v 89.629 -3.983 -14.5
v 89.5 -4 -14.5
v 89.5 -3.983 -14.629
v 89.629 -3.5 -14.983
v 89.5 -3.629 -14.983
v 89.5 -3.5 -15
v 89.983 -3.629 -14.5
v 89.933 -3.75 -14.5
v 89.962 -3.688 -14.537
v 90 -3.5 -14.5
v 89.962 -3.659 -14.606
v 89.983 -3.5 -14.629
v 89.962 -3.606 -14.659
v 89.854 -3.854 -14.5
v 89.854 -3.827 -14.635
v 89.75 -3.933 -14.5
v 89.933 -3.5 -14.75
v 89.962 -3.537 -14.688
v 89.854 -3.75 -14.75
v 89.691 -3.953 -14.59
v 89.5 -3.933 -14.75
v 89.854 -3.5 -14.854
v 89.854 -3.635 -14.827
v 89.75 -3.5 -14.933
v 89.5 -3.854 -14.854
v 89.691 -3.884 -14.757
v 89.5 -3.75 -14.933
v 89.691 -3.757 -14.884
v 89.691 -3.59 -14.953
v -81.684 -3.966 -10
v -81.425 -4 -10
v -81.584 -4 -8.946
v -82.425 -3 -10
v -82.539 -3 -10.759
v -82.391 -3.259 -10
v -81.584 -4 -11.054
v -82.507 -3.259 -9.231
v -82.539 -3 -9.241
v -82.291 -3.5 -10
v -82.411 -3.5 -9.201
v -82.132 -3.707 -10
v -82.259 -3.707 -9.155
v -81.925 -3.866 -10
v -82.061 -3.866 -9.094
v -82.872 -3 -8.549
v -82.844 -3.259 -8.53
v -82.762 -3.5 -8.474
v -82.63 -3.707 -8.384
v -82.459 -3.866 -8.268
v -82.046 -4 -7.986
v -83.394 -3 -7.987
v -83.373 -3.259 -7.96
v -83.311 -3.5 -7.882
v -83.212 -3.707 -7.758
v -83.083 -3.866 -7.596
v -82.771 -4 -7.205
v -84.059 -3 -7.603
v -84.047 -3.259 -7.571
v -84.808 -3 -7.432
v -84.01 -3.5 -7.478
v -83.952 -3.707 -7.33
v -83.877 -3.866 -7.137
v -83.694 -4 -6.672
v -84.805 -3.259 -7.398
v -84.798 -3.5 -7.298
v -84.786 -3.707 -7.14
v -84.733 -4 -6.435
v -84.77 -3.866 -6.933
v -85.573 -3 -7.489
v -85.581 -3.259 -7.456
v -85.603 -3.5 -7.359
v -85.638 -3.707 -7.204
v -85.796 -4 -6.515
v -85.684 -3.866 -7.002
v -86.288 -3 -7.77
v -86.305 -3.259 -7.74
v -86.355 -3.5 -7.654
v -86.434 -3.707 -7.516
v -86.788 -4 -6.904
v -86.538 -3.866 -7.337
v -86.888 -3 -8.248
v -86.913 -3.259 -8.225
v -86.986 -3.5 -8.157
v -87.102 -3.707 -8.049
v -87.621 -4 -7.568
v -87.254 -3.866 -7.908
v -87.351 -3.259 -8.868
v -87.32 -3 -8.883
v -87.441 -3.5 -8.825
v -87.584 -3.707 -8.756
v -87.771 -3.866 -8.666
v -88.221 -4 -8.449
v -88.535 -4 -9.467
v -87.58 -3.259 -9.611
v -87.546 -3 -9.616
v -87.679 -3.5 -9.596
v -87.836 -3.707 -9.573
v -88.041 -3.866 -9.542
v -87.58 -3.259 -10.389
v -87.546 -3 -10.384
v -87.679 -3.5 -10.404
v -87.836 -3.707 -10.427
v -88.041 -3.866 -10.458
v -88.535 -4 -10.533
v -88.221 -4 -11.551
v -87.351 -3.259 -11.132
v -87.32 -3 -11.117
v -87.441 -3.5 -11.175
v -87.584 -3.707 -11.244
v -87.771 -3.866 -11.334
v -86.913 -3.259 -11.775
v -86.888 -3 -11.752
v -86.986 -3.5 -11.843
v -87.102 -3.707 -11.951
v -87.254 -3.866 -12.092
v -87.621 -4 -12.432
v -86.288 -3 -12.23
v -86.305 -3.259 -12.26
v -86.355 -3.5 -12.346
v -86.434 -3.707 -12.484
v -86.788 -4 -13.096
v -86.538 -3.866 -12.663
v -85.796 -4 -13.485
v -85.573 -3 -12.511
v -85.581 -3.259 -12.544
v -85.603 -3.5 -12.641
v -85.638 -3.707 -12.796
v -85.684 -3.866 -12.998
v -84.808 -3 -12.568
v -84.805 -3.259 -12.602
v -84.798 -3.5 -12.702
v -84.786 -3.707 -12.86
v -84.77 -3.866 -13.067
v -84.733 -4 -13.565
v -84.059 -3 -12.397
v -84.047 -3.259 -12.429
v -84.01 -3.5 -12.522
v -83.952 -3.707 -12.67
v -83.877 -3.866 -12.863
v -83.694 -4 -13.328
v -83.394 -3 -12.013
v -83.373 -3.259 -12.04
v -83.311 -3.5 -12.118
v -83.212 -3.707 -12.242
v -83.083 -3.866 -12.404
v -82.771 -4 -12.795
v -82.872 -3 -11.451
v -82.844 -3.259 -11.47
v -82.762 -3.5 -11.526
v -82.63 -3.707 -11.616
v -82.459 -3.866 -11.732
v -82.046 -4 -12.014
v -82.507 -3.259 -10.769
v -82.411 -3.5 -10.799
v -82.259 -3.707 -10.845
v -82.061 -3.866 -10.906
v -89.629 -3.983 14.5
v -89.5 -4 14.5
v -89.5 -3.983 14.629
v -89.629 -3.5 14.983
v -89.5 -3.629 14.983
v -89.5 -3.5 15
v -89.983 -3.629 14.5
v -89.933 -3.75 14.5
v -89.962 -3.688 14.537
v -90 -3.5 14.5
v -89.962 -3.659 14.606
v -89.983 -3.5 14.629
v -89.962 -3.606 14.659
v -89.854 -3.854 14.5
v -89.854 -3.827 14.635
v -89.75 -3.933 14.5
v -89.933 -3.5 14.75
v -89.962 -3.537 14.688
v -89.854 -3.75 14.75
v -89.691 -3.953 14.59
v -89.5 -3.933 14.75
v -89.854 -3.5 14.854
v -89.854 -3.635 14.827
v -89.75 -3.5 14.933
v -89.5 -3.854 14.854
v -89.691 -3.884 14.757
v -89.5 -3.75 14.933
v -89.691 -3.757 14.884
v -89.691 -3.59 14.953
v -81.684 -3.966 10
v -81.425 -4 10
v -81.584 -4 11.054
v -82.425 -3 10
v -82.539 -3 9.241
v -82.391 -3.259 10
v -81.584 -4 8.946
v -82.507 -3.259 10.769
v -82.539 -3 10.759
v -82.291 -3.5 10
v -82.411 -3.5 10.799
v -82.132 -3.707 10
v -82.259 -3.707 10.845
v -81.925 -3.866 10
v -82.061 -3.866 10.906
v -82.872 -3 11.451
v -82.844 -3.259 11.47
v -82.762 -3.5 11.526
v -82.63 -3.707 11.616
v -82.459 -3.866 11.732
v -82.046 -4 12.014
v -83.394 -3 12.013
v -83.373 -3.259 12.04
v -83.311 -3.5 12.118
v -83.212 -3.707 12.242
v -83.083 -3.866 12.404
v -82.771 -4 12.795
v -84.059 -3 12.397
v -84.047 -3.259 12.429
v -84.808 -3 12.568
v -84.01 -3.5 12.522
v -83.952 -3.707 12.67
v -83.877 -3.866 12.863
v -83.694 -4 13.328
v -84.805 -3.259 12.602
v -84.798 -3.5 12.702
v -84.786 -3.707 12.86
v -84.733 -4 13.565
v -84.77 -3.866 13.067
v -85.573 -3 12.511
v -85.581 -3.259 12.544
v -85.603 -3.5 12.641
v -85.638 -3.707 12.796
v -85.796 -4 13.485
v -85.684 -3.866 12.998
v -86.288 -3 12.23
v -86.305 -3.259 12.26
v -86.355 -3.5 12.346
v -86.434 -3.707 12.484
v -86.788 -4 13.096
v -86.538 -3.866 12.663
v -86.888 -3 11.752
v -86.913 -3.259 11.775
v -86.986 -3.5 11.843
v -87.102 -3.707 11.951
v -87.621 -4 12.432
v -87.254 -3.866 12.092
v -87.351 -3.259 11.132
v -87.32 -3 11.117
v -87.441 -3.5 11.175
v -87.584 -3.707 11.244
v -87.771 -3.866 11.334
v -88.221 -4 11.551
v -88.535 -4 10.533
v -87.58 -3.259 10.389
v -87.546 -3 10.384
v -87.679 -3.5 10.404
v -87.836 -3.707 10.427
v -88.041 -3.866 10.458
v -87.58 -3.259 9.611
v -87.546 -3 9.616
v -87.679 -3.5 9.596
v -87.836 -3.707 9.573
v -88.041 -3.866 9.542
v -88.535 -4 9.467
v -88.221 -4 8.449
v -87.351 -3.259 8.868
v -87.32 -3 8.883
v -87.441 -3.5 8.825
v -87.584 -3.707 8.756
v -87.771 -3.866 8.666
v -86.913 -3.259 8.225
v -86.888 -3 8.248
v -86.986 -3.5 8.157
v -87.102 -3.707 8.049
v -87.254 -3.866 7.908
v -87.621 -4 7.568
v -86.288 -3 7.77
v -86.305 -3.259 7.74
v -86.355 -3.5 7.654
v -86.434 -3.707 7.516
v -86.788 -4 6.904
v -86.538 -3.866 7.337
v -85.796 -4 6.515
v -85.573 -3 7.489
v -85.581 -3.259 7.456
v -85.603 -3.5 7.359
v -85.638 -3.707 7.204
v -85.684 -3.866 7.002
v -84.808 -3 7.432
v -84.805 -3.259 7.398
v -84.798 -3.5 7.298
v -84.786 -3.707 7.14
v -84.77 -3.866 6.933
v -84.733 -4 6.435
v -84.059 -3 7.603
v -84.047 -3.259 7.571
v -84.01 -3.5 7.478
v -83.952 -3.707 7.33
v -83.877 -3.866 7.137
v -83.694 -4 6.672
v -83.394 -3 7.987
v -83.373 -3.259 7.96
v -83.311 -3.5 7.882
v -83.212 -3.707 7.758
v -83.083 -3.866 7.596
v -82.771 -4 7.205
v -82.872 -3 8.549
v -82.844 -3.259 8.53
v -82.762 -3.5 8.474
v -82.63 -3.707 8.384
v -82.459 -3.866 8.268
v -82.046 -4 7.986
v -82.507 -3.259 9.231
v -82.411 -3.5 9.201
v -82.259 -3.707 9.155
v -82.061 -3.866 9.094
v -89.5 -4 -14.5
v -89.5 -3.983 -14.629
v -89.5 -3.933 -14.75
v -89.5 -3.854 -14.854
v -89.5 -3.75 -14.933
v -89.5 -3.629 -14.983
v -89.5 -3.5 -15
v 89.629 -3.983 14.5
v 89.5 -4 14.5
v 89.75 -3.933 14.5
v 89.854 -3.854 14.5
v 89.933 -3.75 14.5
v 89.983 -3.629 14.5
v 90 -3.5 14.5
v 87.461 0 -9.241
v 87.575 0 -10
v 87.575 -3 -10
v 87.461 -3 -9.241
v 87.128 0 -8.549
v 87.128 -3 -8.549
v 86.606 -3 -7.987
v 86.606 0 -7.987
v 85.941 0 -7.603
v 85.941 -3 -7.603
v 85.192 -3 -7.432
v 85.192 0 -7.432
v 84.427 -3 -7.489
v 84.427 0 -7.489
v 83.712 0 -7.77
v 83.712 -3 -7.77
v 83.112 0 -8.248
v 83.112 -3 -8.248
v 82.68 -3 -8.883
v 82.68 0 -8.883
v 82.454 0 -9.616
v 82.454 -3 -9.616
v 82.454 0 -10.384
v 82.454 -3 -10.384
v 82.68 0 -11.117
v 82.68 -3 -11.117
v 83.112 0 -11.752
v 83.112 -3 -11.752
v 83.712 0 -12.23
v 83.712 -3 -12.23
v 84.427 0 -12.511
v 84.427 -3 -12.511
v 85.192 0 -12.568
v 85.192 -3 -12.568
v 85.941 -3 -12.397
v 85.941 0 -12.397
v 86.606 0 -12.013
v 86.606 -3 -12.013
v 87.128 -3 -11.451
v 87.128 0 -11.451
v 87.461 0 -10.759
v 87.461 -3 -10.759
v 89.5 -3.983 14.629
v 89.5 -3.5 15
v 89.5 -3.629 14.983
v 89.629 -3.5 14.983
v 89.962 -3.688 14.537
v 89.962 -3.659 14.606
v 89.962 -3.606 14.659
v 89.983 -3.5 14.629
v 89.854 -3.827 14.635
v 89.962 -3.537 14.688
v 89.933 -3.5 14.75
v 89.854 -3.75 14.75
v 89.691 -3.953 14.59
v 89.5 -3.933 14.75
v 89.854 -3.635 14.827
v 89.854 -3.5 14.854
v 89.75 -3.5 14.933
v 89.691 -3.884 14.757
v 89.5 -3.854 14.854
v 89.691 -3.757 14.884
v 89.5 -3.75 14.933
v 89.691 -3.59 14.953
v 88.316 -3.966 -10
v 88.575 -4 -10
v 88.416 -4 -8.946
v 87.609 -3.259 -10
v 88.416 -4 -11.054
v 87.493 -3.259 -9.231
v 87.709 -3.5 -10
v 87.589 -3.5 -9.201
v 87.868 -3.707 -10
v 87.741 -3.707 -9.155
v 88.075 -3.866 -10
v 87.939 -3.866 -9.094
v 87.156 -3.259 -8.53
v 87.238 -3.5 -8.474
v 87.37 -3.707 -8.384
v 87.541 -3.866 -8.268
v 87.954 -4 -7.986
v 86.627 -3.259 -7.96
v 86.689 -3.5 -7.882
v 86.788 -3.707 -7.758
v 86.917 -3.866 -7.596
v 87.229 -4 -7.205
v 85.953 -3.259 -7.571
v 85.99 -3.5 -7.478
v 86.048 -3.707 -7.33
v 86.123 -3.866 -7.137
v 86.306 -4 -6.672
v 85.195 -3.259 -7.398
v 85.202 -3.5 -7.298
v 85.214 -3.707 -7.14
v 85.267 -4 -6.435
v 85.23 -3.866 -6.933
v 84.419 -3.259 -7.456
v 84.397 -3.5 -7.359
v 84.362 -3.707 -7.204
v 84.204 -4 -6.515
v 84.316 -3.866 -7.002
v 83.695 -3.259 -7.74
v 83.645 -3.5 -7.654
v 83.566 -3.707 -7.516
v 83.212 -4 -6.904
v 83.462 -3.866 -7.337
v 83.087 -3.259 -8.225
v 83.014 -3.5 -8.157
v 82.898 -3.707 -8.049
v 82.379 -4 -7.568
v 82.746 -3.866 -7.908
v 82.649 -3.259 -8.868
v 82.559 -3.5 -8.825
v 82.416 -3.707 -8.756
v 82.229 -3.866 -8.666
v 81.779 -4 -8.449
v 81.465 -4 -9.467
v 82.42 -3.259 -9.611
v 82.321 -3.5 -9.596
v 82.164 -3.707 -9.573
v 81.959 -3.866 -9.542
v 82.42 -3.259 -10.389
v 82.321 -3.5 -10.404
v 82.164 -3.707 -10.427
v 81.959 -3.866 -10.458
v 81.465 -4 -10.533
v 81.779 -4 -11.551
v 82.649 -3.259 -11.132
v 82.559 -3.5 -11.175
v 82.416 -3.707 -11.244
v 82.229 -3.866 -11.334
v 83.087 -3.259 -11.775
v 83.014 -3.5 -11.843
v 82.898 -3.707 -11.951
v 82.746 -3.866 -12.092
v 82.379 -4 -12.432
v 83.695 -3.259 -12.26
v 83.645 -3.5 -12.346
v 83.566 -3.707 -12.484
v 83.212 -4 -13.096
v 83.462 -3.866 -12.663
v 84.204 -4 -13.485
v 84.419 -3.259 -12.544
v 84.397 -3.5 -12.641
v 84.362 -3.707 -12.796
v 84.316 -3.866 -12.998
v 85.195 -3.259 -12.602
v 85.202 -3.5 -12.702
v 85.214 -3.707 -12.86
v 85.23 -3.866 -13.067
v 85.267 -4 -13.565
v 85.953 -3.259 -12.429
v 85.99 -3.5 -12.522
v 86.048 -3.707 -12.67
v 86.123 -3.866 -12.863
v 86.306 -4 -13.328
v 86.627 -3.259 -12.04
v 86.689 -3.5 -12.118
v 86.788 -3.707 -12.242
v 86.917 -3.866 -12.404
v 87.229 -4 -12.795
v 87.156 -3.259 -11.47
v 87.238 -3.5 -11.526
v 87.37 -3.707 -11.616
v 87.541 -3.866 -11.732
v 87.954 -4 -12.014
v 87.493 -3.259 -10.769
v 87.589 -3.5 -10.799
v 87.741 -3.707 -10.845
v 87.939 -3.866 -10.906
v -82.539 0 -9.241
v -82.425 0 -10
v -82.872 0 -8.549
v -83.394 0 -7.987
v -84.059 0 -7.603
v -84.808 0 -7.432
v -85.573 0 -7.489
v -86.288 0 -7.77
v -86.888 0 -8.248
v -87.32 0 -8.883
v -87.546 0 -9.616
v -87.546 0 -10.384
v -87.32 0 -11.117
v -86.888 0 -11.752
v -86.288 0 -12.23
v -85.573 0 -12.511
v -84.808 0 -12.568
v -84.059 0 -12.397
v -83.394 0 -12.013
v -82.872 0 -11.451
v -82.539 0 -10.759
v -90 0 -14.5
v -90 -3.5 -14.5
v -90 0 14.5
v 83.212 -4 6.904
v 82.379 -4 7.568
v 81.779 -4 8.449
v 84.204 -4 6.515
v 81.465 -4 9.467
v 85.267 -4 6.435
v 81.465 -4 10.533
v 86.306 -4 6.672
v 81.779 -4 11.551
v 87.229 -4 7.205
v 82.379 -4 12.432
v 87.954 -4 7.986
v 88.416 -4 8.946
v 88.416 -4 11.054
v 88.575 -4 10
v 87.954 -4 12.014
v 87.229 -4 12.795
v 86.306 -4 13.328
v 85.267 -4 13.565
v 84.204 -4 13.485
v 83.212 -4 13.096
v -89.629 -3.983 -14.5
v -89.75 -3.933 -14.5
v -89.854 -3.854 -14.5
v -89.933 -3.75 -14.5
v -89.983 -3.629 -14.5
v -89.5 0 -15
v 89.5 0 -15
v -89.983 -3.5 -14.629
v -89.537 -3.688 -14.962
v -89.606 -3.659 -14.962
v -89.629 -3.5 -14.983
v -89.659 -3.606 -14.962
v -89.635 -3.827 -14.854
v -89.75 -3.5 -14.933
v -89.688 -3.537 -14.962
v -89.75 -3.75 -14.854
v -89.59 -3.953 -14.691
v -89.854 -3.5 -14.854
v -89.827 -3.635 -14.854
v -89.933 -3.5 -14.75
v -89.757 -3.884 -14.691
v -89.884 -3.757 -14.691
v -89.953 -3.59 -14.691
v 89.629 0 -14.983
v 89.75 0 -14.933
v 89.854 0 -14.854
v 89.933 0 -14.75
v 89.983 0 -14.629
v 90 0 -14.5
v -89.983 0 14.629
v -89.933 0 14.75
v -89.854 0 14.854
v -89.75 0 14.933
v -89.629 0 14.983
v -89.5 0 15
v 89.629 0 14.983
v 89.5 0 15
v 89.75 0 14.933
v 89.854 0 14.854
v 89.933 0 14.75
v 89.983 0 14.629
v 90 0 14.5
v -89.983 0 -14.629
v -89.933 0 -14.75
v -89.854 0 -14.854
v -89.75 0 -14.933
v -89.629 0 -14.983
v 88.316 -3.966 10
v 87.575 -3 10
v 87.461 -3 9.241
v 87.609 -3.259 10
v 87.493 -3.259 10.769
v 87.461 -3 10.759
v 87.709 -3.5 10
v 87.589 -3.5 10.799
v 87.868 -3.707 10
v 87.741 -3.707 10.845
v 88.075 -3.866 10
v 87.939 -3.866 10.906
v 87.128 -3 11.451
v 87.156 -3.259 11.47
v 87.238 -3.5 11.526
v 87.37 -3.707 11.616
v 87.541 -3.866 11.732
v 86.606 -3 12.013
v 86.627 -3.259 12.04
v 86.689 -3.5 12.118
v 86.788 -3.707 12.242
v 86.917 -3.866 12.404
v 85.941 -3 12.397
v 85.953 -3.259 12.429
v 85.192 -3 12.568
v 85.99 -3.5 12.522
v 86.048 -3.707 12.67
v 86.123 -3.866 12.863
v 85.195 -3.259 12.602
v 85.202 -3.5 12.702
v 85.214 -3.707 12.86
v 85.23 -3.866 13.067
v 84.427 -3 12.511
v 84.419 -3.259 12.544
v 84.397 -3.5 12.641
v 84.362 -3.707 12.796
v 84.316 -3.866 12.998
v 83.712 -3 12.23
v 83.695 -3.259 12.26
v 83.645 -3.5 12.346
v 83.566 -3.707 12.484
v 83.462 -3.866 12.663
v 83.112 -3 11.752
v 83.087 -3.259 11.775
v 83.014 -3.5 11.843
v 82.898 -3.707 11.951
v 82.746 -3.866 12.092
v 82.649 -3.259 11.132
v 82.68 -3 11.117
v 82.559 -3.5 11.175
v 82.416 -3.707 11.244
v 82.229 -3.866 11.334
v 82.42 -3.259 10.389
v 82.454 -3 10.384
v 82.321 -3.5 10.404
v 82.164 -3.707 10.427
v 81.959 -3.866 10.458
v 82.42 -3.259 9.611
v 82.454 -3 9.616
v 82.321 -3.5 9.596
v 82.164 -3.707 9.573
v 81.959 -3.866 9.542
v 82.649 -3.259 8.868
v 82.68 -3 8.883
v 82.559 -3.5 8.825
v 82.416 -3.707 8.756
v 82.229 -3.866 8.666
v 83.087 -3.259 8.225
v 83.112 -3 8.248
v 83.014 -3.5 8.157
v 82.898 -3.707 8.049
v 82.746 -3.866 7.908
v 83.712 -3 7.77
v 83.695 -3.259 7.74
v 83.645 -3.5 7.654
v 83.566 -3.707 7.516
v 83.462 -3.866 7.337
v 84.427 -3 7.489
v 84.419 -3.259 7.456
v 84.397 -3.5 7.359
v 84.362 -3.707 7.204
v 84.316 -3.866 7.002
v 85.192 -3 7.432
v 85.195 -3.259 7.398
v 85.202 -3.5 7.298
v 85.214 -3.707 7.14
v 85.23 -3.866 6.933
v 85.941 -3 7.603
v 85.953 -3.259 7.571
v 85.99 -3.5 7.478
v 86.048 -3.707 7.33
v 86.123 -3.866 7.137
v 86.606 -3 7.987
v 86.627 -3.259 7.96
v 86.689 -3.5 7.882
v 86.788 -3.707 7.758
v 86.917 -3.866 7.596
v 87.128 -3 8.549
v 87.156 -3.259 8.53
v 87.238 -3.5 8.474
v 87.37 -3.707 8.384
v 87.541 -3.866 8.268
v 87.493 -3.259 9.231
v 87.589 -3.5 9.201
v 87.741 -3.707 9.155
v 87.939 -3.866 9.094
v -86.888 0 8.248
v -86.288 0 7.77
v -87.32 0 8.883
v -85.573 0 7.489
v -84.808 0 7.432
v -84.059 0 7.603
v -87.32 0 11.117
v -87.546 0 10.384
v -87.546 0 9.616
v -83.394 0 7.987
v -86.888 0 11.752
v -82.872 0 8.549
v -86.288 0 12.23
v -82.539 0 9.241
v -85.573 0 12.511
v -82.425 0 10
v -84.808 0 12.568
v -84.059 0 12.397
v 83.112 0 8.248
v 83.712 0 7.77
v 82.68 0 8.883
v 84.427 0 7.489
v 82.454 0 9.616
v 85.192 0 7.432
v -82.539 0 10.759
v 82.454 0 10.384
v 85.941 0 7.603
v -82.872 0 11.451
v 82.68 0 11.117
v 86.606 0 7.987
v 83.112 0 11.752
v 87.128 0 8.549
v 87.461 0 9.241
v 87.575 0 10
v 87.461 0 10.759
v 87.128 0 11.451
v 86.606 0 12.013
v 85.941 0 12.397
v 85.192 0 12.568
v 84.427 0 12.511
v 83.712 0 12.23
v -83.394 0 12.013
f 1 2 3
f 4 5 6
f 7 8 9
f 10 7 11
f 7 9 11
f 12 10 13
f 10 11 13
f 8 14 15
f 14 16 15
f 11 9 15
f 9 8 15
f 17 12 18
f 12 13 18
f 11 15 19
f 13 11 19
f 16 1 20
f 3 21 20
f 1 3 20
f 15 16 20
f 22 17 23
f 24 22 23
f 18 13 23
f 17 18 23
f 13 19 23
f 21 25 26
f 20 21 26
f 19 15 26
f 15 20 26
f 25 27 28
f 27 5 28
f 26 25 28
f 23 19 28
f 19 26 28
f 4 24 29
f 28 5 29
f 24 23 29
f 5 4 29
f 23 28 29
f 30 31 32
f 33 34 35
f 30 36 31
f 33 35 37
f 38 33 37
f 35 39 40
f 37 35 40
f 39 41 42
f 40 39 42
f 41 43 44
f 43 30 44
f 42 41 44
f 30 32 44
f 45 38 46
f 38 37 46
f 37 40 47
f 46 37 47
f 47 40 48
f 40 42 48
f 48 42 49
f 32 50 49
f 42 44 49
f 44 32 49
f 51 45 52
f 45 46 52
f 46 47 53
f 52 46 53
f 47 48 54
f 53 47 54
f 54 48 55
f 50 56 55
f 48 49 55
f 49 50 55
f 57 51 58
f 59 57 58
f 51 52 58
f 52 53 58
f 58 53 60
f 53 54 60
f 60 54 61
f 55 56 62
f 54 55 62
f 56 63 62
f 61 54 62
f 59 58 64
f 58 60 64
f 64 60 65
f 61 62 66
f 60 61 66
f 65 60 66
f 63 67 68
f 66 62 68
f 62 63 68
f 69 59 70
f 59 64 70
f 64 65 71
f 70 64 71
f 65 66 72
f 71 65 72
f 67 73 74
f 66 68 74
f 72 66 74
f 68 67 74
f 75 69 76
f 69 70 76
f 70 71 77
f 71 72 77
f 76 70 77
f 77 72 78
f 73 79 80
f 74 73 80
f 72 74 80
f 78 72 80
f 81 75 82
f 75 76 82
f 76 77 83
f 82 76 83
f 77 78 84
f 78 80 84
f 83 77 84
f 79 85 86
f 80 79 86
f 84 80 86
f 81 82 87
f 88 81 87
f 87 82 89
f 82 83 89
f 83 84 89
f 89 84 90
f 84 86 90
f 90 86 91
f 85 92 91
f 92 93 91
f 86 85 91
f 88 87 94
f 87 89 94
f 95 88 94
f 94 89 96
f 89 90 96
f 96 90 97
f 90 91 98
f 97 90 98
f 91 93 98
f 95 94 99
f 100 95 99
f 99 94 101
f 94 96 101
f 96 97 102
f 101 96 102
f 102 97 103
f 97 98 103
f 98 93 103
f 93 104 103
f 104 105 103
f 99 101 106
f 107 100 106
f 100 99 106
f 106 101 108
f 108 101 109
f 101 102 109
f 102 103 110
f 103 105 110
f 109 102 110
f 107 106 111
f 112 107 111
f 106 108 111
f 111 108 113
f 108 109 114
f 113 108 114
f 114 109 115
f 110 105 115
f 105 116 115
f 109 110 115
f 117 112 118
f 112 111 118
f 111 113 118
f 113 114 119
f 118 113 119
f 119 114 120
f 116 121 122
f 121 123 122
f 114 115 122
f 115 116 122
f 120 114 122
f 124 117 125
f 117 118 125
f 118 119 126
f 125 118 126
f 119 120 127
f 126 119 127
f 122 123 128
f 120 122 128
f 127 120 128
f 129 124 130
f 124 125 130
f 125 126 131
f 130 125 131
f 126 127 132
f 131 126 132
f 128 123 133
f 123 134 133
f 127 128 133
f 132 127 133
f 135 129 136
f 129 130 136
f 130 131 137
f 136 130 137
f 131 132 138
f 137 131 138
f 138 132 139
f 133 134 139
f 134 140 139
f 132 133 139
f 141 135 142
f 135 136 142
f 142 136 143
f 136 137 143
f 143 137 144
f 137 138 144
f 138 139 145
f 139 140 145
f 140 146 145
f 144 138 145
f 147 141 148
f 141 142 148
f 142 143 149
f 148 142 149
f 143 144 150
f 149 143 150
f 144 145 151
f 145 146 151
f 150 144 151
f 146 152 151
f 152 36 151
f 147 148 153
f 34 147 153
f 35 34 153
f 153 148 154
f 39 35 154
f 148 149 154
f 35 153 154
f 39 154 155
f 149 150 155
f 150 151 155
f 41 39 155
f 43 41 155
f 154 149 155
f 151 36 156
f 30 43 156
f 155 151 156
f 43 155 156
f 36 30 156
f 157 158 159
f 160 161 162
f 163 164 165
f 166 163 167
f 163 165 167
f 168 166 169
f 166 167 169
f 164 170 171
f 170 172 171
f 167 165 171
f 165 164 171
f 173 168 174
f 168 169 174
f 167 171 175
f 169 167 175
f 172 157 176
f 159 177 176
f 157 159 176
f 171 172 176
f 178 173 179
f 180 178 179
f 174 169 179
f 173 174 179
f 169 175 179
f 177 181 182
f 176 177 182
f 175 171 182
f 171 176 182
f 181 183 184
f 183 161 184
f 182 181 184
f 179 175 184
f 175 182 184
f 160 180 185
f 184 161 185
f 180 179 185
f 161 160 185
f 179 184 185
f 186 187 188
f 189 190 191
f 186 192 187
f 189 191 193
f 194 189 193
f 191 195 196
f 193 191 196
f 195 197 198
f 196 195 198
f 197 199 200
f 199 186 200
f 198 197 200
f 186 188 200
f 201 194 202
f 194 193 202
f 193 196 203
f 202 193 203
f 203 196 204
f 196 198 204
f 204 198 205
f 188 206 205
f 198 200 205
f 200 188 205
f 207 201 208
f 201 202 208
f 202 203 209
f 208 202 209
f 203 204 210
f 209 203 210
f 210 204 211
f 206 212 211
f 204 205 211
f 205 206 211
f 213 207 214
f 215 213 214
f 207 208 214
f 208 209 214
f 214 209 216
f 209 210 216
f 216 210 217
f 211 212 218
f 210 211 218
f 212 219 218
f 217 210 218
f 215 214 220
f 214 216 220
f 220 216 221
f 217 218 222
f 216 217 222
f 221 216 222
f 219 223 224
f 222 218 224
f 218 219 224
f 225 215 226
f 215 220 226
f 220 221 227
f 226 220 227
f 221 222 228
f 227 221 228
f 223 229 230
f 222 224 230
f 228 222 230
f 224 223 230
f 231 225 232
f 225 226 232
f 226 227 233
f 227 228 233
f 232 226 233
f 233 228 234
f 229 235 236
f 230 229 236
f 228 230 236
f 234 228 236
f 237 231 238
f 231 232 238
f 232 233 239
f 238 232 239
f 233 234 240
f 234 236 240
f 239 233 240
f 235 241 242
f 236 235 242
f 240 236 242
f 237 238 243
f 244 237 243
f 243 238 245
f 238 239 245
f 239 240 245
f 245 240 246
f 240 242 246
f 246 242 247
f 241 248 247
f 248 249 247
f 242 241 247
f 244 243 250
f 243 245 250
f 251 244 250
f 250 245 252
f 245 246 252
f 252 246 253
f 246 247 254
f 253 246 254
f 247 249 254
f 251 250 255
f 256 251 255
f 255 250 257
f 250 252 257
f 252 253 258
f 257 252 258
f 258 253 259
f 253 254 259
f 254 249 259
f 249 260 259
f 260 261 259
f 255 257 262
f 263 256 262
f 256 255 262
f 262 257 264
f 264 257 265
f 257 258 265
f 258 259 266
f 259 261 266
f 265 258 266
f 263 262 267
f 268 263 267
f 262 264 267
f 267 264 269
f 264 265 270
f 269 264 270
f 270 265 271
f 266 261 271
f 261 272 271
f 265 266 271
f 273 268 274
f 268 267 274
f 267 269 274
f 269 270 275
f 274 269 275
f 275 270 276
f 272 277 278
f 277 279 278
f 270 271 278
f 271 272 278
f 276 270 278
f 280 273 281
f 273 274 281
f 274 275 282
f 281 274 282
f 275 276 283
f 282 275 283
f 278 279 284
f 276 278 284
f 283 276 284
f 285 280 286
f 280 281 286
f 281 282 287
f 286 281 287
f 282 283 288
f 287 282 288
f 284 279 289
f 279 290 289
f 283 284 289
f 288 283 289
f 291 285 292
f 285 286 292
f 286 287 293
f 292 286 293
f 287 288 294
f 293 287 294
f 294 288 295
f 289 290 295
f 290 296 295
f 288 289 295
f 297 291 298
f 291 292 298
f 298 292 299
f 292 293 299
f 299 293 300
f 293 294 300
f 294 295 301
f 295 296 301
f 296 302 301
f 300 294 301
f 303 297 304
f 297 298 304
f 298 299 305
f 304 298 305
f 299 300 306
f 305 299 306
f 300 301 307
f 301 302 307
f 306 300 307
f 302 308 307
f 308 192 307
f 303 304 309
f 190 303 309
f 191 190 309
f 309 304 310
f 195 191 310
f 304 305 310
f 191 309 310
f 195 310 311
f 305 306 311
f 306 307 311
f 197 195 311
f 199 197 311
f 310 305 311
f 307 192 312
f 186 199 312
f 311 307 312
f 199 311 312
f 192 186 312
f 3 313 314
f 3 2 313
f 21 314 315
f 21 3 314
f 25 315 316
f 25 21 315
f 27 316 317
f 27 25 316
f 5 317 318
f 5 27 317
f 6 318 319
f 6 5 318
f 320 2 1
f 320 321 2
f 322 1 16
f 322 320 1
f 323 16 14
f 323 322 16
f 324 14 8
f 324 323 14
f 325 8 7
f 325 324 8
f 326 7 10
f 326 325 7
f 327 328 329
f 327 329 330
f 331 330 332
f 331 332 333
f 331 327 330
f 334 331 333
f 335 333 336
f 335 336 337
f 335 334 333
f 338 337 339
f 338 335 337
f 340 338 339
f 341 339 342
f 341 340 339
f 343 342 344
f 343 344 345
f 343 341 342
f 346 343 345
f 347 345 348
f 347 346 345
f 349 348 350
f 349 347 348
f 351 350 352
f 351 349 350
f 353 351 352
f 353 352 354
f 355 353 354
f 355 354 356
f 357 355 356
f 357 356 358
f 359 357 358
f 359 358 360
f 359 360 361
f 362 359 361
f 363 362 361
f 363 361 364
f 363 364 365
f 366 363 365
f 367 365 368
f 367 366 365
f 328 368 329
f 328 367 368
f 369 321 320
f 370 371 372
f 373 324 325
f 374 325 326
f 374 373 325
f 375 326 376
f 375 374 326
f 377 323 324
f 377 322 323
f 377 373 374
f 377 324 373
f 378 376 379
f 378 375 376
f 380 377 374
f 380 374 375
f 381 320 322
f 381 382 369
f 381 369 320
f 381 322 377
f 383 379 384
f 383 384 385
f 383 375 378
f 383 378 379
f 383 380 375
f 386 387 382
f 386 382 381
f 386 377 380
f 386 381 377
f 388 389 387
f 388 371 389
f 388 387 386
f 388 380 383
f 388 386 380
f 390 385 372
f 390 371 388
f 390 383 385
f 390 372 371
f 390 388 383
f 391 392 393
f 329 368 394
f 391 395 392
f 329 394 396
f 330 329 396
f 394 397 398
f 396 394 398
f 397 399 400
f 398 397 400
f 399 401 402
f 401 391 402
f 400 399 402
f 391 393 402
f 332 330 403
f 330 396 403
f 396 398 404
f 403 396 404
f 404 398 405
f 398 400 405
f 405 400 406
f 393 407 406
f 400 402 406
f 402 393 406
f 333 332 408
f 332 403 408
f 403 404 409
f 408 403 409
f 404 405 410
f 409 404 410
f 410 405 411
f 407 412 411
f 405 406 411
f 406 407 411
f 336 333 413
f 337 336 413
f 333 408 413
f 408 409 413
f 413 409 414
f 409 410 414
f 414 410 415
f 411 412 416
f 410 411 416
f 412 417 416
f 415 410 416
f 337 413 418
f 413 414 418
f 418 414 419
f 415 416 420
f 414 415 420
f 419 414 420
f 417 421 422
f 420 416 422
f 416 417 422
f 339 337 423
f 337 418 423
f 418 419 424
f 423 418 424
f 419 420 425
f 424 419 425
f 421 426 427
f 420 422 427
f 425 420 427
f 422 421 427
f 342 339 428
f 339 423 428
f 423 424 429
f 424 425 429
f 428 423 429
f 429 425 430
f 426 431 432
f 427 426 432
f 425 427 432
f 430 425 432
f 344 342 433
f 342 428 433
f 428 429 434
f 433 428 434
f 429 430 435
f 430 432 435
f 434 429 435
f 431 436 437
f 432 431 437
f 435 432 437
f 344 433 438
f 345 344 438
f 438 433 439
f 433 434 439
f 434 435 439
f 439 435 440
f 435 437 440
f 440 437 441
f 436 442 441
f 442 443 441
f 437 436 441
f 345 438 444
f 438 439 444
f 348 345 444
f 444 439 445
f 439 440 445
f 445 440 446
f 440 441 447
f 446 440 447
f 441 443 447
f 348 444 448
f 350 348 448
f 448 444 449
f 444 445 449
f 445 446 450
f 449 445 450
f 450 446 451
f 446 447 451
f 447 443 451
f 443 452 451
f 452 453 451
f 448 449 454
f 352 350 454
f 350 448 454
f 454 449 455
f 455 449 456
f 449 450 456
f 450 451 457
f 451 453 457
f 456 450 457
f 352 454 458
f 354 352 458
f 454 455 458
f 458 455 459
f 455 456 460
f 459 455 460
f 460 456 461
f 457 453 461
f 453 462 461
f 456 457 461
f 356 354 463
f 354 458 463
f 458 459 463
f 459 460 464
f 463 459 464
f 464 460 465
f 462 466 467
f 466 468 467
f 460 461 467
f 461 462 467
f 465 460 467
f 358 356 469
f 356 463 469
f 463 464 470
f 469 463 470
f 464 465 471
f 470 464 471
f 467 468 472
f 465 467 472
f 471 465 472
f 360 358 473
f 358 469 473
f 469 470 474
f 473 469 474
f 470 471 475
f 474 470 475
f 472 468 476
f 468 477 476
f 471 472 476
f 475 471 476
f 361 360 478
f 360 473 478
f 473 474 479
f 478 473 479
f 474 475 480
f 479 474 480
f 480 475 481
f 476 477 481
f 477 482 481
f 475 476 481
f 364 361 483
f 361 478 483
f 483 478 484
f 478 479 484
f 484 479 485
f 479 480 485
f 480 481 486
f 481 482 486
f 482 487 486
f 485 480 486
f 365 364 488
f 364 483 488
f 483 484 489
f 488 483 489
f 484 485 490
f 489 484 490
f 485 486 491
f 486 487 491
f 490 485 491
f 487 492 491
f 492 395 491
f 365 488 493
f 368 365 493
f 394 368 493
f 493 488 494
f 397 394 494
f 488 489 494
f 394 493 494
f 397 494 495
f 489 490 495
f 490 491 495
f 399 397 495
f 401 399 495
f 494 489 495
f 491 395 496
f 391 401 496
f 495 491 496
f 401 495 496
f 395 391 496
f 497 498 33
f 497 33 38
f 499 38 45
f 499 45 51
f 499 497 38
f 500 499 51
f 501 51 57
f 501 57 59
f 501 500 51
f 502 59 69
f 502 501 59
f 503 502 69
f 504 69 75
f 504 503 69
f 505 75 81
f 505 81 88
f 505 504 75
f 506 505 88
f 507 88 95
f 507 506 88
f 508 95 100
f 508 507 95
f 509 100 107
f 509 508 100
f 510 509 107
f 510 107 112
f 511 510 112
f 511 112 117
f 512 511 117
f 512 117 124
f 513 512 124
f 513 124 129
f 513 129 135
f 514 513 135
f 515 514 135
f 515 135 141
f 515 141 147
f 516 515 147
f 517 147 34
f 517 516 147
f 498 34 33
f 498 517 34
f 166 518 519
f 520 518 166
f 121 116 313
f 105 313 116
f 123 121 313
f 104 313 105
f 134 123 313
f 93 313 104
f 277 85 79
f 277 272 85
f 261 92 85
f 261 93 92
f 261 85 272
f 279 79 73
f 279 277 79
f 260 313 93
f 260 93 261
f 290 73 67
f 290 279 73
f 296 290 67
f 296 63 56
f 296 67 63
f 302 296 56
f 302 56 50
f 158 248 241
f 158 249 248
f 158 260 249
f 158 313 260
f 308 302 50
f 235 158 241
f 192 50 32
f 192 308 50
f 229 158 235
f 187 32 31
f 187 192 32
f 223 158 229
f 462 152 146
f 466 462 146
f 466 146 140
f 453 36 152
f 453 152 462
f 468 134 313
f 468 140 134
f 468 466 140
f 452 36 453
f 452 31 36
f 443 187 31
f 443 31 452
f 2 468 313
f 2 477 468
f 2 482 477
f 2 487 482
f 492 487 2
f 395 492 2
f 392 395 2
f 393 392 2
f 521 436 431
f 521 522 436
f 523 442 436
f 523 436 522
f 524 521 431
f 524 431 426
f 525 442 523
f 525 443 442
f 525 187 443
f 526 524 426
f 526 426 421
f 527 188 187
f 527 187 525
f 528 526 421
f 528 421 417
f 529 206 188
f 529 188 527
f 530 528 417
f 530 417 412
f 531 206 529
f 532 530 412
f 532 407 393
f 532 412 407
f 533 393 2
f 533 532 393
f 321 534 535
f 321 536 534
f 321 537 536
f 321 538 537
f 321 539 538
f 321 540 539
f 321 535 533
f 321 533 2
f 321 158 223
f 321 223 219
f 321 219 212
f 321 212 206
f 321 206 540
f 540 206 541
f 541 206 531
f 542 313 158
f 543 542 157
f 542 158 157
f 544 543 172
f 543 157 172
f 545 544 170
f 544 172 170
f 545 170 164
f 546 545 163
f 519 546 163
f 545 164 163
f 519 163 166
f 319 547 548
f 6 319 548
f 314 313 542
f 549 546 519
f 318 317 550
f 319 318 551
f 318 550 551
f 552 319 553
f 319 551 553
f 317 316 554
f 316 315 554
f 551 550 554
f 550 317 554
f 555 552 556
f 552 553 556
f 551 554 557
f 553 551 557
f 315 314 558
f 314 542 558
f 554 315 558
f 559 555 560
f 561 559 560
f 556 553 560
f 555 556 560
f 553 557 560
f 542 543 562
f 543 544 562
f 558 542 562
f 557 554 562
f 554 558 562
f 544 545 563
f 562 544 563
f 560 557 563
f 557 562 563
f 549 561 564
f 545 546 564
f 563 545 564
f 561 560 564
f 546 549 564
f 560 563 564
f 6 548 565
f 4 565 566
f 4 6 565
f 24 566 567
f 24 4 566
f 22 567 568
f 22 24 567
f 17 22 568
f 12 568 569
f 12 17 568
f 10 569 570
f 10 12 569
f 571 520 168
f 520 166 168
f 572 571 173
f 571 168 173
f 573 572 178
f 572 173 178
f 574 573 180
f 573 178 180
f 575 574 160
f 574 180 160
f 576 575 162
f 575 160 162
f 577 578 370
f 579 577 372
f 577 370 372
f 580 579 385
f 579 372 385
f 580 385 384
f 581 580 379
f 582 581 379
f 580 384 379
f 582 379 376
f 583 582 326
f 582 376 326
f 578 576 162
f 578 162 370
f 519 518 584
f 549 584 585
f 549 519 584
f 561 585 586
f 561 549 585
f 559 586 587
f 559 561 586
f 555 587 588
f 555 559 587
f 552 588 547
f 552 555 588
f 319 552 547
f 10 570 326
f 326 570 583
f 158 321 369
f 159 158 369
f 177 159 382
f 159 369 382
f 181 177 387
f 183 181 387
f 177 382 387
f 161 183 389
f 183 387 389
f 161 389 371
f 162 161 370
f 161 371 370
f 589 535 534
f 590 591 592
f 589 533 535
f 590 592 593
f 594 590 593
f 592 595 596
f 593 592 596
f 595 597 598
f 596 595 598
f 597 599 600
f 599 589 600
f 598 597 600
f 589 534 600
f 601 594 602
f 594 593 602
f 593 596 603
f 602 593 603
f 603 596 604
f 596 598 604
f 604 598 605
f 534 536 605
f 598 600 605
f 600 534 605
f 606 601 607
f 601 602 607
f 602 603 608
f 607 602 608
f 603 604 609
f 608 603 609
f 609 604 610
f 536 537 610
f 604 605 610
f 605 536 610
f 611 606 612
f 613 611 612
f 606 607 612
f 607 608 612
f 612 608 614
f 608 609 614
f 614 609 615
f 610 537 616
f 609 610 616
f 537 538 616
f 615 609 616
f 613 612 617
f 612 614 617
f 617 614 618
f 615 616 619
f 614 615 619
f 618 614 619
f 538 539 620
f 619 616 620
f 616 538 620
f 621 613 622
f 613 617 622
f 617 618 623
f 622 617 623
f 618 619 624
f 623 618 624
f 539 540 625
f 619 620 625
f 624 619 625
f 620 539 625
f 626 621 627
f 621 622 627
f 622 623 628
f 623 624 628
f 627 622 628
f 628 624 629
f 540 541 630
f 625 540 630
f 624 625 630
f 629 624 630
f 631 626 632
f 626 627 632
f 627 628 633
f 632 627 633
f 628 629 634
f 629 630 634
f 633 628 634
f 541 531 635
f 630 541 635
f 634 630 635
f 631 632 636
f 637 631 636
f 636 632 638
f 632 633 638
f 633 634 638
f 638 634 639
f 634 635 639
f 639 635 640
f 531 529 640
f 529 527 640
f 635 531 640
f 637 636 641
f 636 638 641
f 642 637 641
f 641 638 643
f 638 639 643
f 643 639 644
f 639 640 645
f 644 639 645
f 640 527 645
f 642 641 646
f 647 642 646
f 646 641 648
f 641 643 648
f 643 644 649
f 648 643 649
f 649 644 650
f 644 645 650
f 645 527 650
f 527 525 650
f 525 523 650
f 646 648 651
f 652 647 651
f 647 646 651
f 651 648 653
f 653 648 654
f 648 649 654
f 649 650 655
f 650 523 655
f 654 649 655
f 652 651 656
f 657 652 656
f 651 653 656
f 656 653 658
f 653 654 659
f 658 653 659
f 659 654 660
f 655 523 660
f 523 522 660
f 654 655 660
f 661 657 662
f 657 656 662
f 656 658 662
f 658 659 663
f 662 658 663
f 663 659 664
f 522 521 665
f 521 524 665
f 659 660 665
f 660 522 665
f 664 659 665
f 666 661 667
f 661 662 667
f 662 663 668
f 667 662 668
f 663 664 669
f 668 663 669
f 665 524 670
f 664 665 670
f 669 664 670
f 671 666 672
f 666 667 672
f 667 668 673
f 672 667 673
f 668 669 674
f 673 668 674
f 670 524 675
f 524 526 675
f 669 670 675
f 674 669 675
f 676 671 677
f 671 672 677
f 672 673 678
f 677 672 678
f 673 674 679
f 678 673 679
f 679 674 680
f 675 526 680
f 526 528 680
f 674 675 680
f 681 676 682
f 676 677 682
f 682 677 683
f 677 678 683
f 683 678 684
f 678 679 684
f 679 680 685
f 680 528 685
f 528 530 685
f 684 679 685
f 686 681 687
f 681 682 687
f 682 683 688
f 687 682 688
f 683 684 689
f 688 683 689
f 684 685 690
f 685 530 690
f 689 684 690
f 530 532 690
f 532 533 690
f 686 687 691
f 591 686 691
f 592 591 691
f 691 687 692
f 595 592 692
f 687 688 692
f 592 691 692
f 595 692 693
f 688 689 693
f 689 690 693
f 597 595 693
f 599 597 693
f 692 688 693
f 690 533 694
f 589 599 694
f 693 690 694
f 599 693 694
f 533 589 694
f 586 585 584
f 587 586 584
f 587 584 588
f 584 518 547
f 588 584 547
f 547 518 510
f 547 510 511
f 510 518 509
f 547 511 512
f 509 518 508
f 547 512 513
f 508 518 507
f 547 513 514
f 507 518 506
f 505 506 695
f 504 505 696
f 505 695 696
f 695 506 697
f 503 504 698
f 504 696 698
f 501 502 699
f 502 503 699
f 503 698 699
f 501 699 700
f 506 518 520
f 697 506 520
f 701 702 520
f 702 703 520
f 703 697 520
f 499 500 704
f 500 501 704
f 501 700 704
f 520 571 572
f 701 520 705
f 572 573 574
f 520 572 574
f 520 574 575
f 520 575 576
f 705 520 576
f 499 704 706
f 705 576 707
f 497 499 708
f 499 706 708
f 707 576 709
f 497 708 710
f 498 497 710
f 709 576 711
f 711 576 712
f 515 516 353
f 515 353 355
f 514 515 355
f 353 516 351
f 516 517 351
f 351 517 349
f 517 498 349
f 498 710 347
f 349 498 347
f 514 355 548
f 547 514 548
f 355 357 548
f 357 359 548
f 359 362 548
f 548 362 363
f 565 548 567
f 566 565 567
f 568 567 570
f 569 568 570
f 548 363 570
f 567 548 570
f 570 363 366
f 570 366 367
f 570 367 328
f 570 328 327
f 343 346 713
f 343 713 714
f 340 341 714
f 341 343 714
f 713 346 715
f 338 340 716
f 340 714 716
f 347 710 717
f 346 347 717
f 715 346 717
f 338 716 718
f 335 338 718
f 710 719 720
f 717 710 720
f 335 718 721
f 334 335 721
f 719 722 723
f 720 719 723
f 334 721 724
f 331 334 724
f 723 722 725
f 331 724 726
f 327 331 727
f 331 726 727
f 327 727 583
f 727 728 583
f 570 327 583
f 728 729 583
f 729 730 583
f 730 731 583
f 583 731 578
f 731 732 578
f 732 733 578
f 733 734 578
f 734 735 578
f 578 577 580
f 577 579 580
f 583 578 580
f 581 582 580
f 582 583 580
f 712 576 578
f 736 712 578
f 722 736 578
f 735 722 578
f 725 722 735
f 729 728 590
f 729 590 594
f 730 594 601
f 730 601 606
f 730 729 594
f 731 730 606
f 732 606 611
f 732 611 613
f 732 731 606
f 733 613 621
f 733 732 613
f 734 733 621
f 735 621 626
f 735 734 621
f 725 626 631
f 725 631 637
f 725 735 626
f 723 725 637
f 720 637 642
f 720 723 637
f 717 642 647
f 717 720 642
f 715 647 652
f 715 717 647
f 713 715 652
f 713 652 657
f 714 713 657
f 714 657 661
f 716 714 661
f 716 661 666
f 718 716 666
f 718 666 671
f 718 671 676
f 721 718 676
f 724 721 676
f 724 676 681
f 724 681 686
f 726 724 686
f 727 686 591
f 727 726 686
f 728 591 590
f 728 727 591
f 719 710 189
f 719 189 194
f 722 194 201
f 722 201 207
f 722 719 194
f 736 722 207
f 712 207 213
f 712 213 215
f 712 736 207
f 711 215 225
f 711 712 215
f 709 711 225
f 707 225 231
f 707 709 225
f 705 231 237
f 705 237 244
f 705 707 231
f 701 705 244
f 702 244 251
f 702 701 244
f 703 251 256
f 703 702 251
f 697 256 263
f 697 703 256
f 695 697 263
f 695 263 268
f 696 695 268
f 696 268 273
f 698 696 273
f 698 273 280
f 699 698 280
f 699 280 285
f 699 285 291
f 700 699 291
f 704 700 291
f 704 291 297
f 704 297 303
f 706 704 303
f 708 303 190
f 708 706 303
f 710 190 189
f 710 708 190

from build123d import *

# Parameters (mm, degrees)
F0_W     = 180
F0_H     = 30
F0_R     = 2.5751263091
F1_DEPTH = 4
F2_R     = 1
F3_R     = 0.5


# Not quite as in the source:
# - a feature names something its author has since deleted; it is built from what else it names


with BuildPart() as f1:
    # F0 (on Front) → F1 (new body)
    with BuildSketch(Plane.XZ):
        Rectangle(F0_W, F0_H)
        with Locations((-85, -10)):
            Circle(F0_R, mode=Mode.SUBTRACT)
        with Locations((85, -10)):
            Circle(F0_R, mode=Mode.SUBTRACT)
        with Locations((-85, 10)):
            Circle(F0_R, mode=Mode.SUBTRACT)
        with Locations((85, 10)):
            Circle(F0_R, mode=Mode.SUBTRACT)
    extrude(amount=F1_DEPTH)

    # F2
    f2_edges = [f1.edges().sort_by_distance(p)[0] for p in [
        (-87.575126, -4, 10),
        (-87.575126, -4, -10),
        (82.424874, -4, 10),
        (82.424874, -4, -10),
    ]]
    fillet(f2_edges, radius=F2_R)

    # F3
    f3_edges = [f1.edges().sort_by_distance(p)[0] for p in [
        (0, -4, 15),
        (-90, -4, 0),
        (0, -4, -15),
        (90, -4, 0),
        (-90, -2, 15),
        (-90, -2, -15),
        (90, -2, 15),
        (90, -2, -15),
    ]]
    fillet(f3_edges, radius=F3_R)


solid = f1.part
